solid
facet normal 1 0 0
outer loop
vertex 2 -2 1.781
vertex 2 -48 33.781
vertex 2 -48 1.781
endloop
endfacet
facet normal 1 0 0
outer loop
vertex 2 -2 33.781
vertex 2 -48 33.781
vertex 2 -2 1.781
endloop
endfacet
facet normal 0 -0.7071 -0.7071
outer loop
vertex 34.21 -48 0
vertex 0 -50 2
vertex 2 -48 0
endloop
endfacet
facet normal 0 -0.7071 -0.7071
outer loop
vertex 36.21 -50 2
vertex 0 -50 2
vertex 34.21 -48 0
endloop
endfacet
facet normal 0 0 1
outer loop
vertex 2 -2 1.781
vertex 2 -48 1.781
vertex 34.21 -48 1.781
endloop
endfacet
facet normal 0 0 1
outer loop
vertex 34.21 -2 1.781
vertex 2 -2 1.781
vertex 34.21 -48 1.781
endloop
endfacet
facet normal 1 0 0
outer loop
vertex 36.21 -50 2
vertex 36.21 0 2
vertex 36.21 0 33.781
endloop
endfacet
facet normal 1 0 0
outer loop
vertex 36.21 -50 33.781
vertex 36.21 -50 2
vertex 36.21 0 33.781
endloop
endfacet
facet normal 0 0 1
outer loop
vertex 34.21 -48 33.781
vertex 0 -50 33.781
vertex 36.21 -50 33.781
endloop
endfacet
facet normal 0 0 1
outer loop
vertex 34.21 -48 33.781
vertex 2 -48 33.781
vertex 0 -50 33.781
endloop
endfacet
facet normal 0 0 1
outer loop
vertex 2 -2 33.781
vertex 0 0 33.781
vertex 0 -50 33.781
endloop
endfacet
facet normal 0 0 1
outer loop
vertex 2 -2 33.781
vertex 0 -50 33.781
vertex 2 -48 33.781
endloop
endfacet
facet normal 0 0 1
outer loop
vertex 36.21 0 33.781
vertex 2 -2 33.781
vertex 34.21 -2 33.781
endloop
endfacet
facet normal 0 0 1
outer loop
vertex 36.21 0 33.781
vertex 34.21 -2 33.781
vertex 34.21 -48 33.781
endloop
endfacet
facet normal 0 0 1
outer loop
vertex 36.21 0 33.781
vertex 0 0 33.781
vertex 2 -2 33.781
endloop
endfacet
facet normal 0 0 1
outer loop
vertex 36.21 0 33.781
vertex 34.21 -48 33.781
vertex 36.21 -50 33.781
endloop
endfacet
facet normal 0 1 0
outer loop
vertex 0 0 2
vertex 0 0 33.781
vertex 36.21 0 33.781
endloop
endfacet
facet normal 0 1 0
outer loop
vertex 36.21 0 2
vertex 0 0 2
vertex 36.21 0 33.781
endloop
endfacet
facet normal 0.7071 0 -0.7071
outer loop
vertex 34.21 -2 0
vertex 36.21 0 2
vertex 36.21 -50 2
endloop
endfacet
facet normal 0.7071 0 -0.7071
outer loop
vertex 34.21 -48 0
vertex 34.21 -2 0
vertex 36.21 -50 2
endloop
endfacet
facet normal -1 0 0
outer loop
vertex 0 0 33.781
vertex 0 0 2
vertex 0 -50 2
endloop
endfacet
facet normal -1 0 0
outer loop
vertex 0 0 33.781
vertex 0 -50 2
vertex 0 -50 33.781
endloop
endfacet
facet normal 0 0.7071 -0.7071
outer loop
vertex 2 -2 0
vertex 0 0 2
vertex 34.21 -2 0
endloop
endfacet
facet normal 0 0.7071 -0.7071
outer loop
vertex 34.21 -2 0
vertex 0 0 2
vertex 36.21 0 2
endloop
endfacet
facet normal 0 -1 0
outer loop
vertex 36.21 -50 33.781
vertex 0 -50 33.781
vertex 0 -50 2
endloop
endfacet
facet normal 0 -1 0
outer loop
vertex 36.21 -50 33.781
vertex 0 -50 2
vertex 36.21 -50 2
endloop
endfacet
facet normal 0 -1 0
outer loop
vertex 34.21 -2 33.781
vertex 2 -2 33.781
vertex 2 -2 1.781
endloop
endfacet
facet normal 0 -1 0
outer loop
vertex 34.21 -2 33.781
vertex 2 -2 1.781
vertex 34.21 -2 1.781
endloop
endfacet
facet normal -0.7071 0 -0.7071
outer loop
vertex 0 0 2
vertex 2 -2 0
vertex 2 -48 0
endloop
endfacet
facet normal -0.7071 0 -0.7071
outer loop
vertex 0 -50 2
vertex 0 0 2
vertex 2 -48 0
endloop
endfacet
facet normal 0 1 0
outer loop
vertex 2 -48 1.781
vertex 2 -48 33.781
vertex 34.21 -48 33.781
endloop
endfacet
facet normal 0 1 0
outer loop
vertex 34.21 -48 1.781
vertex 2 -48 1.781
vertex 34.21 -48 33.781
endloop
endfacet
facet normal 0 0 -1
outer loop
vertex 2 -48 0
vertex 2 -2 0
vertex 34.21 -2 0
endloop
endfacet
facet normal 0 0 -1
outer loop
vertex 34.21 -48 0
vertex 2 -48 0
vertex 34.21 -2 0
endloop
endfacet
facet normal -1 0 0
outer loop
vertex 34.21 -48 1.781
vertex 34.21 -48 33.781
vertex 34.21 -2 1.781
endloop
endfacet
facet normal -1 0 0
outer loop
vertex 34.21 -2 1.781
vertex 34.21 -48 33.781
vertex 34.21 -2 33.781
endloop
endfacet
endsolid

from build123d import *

# Parameters (mm, degrees)
F0_W     = 36.2096428871
F0_H     = 33.7809510529
F1_DEPTH = 50
F2_W     = 32.2096428871
F2_H     = 46
F3_DEPTH = 32
F4_SIZE  = 2


with BuildPart() as f1:
    # F0 (on Front) → F1 (new body)
    with BuildSketch(Plane.XZ):
        with Locations((18.1048214436, 16.8904755265)):
            Rectangle(F0_W, F0_H)
    extrude(amount=F1_DEPTH)

    # F2 (on face) → F3 (cut)
    with BuildSketch(Plane.XY.offset(33.7809510529)):
        with Locations((18.1048214436, -25)):
            Rectangle(F2_W, F2_H)
    extrude(amount=-F3_DEPTH, mode=Mode.SUBTRACT)

    # F4
    f4_edges = [f1.edges().sort_by_distance(p)[0] for p in [
        (18.104821, 0, 0),
        (0, -25, 0),
        (36.209643, -25, 0),
        (18.104821, -50, 0),
    ]]
    chamfer(f4_edges, length=F4_SIZE)


solid = f1.part
